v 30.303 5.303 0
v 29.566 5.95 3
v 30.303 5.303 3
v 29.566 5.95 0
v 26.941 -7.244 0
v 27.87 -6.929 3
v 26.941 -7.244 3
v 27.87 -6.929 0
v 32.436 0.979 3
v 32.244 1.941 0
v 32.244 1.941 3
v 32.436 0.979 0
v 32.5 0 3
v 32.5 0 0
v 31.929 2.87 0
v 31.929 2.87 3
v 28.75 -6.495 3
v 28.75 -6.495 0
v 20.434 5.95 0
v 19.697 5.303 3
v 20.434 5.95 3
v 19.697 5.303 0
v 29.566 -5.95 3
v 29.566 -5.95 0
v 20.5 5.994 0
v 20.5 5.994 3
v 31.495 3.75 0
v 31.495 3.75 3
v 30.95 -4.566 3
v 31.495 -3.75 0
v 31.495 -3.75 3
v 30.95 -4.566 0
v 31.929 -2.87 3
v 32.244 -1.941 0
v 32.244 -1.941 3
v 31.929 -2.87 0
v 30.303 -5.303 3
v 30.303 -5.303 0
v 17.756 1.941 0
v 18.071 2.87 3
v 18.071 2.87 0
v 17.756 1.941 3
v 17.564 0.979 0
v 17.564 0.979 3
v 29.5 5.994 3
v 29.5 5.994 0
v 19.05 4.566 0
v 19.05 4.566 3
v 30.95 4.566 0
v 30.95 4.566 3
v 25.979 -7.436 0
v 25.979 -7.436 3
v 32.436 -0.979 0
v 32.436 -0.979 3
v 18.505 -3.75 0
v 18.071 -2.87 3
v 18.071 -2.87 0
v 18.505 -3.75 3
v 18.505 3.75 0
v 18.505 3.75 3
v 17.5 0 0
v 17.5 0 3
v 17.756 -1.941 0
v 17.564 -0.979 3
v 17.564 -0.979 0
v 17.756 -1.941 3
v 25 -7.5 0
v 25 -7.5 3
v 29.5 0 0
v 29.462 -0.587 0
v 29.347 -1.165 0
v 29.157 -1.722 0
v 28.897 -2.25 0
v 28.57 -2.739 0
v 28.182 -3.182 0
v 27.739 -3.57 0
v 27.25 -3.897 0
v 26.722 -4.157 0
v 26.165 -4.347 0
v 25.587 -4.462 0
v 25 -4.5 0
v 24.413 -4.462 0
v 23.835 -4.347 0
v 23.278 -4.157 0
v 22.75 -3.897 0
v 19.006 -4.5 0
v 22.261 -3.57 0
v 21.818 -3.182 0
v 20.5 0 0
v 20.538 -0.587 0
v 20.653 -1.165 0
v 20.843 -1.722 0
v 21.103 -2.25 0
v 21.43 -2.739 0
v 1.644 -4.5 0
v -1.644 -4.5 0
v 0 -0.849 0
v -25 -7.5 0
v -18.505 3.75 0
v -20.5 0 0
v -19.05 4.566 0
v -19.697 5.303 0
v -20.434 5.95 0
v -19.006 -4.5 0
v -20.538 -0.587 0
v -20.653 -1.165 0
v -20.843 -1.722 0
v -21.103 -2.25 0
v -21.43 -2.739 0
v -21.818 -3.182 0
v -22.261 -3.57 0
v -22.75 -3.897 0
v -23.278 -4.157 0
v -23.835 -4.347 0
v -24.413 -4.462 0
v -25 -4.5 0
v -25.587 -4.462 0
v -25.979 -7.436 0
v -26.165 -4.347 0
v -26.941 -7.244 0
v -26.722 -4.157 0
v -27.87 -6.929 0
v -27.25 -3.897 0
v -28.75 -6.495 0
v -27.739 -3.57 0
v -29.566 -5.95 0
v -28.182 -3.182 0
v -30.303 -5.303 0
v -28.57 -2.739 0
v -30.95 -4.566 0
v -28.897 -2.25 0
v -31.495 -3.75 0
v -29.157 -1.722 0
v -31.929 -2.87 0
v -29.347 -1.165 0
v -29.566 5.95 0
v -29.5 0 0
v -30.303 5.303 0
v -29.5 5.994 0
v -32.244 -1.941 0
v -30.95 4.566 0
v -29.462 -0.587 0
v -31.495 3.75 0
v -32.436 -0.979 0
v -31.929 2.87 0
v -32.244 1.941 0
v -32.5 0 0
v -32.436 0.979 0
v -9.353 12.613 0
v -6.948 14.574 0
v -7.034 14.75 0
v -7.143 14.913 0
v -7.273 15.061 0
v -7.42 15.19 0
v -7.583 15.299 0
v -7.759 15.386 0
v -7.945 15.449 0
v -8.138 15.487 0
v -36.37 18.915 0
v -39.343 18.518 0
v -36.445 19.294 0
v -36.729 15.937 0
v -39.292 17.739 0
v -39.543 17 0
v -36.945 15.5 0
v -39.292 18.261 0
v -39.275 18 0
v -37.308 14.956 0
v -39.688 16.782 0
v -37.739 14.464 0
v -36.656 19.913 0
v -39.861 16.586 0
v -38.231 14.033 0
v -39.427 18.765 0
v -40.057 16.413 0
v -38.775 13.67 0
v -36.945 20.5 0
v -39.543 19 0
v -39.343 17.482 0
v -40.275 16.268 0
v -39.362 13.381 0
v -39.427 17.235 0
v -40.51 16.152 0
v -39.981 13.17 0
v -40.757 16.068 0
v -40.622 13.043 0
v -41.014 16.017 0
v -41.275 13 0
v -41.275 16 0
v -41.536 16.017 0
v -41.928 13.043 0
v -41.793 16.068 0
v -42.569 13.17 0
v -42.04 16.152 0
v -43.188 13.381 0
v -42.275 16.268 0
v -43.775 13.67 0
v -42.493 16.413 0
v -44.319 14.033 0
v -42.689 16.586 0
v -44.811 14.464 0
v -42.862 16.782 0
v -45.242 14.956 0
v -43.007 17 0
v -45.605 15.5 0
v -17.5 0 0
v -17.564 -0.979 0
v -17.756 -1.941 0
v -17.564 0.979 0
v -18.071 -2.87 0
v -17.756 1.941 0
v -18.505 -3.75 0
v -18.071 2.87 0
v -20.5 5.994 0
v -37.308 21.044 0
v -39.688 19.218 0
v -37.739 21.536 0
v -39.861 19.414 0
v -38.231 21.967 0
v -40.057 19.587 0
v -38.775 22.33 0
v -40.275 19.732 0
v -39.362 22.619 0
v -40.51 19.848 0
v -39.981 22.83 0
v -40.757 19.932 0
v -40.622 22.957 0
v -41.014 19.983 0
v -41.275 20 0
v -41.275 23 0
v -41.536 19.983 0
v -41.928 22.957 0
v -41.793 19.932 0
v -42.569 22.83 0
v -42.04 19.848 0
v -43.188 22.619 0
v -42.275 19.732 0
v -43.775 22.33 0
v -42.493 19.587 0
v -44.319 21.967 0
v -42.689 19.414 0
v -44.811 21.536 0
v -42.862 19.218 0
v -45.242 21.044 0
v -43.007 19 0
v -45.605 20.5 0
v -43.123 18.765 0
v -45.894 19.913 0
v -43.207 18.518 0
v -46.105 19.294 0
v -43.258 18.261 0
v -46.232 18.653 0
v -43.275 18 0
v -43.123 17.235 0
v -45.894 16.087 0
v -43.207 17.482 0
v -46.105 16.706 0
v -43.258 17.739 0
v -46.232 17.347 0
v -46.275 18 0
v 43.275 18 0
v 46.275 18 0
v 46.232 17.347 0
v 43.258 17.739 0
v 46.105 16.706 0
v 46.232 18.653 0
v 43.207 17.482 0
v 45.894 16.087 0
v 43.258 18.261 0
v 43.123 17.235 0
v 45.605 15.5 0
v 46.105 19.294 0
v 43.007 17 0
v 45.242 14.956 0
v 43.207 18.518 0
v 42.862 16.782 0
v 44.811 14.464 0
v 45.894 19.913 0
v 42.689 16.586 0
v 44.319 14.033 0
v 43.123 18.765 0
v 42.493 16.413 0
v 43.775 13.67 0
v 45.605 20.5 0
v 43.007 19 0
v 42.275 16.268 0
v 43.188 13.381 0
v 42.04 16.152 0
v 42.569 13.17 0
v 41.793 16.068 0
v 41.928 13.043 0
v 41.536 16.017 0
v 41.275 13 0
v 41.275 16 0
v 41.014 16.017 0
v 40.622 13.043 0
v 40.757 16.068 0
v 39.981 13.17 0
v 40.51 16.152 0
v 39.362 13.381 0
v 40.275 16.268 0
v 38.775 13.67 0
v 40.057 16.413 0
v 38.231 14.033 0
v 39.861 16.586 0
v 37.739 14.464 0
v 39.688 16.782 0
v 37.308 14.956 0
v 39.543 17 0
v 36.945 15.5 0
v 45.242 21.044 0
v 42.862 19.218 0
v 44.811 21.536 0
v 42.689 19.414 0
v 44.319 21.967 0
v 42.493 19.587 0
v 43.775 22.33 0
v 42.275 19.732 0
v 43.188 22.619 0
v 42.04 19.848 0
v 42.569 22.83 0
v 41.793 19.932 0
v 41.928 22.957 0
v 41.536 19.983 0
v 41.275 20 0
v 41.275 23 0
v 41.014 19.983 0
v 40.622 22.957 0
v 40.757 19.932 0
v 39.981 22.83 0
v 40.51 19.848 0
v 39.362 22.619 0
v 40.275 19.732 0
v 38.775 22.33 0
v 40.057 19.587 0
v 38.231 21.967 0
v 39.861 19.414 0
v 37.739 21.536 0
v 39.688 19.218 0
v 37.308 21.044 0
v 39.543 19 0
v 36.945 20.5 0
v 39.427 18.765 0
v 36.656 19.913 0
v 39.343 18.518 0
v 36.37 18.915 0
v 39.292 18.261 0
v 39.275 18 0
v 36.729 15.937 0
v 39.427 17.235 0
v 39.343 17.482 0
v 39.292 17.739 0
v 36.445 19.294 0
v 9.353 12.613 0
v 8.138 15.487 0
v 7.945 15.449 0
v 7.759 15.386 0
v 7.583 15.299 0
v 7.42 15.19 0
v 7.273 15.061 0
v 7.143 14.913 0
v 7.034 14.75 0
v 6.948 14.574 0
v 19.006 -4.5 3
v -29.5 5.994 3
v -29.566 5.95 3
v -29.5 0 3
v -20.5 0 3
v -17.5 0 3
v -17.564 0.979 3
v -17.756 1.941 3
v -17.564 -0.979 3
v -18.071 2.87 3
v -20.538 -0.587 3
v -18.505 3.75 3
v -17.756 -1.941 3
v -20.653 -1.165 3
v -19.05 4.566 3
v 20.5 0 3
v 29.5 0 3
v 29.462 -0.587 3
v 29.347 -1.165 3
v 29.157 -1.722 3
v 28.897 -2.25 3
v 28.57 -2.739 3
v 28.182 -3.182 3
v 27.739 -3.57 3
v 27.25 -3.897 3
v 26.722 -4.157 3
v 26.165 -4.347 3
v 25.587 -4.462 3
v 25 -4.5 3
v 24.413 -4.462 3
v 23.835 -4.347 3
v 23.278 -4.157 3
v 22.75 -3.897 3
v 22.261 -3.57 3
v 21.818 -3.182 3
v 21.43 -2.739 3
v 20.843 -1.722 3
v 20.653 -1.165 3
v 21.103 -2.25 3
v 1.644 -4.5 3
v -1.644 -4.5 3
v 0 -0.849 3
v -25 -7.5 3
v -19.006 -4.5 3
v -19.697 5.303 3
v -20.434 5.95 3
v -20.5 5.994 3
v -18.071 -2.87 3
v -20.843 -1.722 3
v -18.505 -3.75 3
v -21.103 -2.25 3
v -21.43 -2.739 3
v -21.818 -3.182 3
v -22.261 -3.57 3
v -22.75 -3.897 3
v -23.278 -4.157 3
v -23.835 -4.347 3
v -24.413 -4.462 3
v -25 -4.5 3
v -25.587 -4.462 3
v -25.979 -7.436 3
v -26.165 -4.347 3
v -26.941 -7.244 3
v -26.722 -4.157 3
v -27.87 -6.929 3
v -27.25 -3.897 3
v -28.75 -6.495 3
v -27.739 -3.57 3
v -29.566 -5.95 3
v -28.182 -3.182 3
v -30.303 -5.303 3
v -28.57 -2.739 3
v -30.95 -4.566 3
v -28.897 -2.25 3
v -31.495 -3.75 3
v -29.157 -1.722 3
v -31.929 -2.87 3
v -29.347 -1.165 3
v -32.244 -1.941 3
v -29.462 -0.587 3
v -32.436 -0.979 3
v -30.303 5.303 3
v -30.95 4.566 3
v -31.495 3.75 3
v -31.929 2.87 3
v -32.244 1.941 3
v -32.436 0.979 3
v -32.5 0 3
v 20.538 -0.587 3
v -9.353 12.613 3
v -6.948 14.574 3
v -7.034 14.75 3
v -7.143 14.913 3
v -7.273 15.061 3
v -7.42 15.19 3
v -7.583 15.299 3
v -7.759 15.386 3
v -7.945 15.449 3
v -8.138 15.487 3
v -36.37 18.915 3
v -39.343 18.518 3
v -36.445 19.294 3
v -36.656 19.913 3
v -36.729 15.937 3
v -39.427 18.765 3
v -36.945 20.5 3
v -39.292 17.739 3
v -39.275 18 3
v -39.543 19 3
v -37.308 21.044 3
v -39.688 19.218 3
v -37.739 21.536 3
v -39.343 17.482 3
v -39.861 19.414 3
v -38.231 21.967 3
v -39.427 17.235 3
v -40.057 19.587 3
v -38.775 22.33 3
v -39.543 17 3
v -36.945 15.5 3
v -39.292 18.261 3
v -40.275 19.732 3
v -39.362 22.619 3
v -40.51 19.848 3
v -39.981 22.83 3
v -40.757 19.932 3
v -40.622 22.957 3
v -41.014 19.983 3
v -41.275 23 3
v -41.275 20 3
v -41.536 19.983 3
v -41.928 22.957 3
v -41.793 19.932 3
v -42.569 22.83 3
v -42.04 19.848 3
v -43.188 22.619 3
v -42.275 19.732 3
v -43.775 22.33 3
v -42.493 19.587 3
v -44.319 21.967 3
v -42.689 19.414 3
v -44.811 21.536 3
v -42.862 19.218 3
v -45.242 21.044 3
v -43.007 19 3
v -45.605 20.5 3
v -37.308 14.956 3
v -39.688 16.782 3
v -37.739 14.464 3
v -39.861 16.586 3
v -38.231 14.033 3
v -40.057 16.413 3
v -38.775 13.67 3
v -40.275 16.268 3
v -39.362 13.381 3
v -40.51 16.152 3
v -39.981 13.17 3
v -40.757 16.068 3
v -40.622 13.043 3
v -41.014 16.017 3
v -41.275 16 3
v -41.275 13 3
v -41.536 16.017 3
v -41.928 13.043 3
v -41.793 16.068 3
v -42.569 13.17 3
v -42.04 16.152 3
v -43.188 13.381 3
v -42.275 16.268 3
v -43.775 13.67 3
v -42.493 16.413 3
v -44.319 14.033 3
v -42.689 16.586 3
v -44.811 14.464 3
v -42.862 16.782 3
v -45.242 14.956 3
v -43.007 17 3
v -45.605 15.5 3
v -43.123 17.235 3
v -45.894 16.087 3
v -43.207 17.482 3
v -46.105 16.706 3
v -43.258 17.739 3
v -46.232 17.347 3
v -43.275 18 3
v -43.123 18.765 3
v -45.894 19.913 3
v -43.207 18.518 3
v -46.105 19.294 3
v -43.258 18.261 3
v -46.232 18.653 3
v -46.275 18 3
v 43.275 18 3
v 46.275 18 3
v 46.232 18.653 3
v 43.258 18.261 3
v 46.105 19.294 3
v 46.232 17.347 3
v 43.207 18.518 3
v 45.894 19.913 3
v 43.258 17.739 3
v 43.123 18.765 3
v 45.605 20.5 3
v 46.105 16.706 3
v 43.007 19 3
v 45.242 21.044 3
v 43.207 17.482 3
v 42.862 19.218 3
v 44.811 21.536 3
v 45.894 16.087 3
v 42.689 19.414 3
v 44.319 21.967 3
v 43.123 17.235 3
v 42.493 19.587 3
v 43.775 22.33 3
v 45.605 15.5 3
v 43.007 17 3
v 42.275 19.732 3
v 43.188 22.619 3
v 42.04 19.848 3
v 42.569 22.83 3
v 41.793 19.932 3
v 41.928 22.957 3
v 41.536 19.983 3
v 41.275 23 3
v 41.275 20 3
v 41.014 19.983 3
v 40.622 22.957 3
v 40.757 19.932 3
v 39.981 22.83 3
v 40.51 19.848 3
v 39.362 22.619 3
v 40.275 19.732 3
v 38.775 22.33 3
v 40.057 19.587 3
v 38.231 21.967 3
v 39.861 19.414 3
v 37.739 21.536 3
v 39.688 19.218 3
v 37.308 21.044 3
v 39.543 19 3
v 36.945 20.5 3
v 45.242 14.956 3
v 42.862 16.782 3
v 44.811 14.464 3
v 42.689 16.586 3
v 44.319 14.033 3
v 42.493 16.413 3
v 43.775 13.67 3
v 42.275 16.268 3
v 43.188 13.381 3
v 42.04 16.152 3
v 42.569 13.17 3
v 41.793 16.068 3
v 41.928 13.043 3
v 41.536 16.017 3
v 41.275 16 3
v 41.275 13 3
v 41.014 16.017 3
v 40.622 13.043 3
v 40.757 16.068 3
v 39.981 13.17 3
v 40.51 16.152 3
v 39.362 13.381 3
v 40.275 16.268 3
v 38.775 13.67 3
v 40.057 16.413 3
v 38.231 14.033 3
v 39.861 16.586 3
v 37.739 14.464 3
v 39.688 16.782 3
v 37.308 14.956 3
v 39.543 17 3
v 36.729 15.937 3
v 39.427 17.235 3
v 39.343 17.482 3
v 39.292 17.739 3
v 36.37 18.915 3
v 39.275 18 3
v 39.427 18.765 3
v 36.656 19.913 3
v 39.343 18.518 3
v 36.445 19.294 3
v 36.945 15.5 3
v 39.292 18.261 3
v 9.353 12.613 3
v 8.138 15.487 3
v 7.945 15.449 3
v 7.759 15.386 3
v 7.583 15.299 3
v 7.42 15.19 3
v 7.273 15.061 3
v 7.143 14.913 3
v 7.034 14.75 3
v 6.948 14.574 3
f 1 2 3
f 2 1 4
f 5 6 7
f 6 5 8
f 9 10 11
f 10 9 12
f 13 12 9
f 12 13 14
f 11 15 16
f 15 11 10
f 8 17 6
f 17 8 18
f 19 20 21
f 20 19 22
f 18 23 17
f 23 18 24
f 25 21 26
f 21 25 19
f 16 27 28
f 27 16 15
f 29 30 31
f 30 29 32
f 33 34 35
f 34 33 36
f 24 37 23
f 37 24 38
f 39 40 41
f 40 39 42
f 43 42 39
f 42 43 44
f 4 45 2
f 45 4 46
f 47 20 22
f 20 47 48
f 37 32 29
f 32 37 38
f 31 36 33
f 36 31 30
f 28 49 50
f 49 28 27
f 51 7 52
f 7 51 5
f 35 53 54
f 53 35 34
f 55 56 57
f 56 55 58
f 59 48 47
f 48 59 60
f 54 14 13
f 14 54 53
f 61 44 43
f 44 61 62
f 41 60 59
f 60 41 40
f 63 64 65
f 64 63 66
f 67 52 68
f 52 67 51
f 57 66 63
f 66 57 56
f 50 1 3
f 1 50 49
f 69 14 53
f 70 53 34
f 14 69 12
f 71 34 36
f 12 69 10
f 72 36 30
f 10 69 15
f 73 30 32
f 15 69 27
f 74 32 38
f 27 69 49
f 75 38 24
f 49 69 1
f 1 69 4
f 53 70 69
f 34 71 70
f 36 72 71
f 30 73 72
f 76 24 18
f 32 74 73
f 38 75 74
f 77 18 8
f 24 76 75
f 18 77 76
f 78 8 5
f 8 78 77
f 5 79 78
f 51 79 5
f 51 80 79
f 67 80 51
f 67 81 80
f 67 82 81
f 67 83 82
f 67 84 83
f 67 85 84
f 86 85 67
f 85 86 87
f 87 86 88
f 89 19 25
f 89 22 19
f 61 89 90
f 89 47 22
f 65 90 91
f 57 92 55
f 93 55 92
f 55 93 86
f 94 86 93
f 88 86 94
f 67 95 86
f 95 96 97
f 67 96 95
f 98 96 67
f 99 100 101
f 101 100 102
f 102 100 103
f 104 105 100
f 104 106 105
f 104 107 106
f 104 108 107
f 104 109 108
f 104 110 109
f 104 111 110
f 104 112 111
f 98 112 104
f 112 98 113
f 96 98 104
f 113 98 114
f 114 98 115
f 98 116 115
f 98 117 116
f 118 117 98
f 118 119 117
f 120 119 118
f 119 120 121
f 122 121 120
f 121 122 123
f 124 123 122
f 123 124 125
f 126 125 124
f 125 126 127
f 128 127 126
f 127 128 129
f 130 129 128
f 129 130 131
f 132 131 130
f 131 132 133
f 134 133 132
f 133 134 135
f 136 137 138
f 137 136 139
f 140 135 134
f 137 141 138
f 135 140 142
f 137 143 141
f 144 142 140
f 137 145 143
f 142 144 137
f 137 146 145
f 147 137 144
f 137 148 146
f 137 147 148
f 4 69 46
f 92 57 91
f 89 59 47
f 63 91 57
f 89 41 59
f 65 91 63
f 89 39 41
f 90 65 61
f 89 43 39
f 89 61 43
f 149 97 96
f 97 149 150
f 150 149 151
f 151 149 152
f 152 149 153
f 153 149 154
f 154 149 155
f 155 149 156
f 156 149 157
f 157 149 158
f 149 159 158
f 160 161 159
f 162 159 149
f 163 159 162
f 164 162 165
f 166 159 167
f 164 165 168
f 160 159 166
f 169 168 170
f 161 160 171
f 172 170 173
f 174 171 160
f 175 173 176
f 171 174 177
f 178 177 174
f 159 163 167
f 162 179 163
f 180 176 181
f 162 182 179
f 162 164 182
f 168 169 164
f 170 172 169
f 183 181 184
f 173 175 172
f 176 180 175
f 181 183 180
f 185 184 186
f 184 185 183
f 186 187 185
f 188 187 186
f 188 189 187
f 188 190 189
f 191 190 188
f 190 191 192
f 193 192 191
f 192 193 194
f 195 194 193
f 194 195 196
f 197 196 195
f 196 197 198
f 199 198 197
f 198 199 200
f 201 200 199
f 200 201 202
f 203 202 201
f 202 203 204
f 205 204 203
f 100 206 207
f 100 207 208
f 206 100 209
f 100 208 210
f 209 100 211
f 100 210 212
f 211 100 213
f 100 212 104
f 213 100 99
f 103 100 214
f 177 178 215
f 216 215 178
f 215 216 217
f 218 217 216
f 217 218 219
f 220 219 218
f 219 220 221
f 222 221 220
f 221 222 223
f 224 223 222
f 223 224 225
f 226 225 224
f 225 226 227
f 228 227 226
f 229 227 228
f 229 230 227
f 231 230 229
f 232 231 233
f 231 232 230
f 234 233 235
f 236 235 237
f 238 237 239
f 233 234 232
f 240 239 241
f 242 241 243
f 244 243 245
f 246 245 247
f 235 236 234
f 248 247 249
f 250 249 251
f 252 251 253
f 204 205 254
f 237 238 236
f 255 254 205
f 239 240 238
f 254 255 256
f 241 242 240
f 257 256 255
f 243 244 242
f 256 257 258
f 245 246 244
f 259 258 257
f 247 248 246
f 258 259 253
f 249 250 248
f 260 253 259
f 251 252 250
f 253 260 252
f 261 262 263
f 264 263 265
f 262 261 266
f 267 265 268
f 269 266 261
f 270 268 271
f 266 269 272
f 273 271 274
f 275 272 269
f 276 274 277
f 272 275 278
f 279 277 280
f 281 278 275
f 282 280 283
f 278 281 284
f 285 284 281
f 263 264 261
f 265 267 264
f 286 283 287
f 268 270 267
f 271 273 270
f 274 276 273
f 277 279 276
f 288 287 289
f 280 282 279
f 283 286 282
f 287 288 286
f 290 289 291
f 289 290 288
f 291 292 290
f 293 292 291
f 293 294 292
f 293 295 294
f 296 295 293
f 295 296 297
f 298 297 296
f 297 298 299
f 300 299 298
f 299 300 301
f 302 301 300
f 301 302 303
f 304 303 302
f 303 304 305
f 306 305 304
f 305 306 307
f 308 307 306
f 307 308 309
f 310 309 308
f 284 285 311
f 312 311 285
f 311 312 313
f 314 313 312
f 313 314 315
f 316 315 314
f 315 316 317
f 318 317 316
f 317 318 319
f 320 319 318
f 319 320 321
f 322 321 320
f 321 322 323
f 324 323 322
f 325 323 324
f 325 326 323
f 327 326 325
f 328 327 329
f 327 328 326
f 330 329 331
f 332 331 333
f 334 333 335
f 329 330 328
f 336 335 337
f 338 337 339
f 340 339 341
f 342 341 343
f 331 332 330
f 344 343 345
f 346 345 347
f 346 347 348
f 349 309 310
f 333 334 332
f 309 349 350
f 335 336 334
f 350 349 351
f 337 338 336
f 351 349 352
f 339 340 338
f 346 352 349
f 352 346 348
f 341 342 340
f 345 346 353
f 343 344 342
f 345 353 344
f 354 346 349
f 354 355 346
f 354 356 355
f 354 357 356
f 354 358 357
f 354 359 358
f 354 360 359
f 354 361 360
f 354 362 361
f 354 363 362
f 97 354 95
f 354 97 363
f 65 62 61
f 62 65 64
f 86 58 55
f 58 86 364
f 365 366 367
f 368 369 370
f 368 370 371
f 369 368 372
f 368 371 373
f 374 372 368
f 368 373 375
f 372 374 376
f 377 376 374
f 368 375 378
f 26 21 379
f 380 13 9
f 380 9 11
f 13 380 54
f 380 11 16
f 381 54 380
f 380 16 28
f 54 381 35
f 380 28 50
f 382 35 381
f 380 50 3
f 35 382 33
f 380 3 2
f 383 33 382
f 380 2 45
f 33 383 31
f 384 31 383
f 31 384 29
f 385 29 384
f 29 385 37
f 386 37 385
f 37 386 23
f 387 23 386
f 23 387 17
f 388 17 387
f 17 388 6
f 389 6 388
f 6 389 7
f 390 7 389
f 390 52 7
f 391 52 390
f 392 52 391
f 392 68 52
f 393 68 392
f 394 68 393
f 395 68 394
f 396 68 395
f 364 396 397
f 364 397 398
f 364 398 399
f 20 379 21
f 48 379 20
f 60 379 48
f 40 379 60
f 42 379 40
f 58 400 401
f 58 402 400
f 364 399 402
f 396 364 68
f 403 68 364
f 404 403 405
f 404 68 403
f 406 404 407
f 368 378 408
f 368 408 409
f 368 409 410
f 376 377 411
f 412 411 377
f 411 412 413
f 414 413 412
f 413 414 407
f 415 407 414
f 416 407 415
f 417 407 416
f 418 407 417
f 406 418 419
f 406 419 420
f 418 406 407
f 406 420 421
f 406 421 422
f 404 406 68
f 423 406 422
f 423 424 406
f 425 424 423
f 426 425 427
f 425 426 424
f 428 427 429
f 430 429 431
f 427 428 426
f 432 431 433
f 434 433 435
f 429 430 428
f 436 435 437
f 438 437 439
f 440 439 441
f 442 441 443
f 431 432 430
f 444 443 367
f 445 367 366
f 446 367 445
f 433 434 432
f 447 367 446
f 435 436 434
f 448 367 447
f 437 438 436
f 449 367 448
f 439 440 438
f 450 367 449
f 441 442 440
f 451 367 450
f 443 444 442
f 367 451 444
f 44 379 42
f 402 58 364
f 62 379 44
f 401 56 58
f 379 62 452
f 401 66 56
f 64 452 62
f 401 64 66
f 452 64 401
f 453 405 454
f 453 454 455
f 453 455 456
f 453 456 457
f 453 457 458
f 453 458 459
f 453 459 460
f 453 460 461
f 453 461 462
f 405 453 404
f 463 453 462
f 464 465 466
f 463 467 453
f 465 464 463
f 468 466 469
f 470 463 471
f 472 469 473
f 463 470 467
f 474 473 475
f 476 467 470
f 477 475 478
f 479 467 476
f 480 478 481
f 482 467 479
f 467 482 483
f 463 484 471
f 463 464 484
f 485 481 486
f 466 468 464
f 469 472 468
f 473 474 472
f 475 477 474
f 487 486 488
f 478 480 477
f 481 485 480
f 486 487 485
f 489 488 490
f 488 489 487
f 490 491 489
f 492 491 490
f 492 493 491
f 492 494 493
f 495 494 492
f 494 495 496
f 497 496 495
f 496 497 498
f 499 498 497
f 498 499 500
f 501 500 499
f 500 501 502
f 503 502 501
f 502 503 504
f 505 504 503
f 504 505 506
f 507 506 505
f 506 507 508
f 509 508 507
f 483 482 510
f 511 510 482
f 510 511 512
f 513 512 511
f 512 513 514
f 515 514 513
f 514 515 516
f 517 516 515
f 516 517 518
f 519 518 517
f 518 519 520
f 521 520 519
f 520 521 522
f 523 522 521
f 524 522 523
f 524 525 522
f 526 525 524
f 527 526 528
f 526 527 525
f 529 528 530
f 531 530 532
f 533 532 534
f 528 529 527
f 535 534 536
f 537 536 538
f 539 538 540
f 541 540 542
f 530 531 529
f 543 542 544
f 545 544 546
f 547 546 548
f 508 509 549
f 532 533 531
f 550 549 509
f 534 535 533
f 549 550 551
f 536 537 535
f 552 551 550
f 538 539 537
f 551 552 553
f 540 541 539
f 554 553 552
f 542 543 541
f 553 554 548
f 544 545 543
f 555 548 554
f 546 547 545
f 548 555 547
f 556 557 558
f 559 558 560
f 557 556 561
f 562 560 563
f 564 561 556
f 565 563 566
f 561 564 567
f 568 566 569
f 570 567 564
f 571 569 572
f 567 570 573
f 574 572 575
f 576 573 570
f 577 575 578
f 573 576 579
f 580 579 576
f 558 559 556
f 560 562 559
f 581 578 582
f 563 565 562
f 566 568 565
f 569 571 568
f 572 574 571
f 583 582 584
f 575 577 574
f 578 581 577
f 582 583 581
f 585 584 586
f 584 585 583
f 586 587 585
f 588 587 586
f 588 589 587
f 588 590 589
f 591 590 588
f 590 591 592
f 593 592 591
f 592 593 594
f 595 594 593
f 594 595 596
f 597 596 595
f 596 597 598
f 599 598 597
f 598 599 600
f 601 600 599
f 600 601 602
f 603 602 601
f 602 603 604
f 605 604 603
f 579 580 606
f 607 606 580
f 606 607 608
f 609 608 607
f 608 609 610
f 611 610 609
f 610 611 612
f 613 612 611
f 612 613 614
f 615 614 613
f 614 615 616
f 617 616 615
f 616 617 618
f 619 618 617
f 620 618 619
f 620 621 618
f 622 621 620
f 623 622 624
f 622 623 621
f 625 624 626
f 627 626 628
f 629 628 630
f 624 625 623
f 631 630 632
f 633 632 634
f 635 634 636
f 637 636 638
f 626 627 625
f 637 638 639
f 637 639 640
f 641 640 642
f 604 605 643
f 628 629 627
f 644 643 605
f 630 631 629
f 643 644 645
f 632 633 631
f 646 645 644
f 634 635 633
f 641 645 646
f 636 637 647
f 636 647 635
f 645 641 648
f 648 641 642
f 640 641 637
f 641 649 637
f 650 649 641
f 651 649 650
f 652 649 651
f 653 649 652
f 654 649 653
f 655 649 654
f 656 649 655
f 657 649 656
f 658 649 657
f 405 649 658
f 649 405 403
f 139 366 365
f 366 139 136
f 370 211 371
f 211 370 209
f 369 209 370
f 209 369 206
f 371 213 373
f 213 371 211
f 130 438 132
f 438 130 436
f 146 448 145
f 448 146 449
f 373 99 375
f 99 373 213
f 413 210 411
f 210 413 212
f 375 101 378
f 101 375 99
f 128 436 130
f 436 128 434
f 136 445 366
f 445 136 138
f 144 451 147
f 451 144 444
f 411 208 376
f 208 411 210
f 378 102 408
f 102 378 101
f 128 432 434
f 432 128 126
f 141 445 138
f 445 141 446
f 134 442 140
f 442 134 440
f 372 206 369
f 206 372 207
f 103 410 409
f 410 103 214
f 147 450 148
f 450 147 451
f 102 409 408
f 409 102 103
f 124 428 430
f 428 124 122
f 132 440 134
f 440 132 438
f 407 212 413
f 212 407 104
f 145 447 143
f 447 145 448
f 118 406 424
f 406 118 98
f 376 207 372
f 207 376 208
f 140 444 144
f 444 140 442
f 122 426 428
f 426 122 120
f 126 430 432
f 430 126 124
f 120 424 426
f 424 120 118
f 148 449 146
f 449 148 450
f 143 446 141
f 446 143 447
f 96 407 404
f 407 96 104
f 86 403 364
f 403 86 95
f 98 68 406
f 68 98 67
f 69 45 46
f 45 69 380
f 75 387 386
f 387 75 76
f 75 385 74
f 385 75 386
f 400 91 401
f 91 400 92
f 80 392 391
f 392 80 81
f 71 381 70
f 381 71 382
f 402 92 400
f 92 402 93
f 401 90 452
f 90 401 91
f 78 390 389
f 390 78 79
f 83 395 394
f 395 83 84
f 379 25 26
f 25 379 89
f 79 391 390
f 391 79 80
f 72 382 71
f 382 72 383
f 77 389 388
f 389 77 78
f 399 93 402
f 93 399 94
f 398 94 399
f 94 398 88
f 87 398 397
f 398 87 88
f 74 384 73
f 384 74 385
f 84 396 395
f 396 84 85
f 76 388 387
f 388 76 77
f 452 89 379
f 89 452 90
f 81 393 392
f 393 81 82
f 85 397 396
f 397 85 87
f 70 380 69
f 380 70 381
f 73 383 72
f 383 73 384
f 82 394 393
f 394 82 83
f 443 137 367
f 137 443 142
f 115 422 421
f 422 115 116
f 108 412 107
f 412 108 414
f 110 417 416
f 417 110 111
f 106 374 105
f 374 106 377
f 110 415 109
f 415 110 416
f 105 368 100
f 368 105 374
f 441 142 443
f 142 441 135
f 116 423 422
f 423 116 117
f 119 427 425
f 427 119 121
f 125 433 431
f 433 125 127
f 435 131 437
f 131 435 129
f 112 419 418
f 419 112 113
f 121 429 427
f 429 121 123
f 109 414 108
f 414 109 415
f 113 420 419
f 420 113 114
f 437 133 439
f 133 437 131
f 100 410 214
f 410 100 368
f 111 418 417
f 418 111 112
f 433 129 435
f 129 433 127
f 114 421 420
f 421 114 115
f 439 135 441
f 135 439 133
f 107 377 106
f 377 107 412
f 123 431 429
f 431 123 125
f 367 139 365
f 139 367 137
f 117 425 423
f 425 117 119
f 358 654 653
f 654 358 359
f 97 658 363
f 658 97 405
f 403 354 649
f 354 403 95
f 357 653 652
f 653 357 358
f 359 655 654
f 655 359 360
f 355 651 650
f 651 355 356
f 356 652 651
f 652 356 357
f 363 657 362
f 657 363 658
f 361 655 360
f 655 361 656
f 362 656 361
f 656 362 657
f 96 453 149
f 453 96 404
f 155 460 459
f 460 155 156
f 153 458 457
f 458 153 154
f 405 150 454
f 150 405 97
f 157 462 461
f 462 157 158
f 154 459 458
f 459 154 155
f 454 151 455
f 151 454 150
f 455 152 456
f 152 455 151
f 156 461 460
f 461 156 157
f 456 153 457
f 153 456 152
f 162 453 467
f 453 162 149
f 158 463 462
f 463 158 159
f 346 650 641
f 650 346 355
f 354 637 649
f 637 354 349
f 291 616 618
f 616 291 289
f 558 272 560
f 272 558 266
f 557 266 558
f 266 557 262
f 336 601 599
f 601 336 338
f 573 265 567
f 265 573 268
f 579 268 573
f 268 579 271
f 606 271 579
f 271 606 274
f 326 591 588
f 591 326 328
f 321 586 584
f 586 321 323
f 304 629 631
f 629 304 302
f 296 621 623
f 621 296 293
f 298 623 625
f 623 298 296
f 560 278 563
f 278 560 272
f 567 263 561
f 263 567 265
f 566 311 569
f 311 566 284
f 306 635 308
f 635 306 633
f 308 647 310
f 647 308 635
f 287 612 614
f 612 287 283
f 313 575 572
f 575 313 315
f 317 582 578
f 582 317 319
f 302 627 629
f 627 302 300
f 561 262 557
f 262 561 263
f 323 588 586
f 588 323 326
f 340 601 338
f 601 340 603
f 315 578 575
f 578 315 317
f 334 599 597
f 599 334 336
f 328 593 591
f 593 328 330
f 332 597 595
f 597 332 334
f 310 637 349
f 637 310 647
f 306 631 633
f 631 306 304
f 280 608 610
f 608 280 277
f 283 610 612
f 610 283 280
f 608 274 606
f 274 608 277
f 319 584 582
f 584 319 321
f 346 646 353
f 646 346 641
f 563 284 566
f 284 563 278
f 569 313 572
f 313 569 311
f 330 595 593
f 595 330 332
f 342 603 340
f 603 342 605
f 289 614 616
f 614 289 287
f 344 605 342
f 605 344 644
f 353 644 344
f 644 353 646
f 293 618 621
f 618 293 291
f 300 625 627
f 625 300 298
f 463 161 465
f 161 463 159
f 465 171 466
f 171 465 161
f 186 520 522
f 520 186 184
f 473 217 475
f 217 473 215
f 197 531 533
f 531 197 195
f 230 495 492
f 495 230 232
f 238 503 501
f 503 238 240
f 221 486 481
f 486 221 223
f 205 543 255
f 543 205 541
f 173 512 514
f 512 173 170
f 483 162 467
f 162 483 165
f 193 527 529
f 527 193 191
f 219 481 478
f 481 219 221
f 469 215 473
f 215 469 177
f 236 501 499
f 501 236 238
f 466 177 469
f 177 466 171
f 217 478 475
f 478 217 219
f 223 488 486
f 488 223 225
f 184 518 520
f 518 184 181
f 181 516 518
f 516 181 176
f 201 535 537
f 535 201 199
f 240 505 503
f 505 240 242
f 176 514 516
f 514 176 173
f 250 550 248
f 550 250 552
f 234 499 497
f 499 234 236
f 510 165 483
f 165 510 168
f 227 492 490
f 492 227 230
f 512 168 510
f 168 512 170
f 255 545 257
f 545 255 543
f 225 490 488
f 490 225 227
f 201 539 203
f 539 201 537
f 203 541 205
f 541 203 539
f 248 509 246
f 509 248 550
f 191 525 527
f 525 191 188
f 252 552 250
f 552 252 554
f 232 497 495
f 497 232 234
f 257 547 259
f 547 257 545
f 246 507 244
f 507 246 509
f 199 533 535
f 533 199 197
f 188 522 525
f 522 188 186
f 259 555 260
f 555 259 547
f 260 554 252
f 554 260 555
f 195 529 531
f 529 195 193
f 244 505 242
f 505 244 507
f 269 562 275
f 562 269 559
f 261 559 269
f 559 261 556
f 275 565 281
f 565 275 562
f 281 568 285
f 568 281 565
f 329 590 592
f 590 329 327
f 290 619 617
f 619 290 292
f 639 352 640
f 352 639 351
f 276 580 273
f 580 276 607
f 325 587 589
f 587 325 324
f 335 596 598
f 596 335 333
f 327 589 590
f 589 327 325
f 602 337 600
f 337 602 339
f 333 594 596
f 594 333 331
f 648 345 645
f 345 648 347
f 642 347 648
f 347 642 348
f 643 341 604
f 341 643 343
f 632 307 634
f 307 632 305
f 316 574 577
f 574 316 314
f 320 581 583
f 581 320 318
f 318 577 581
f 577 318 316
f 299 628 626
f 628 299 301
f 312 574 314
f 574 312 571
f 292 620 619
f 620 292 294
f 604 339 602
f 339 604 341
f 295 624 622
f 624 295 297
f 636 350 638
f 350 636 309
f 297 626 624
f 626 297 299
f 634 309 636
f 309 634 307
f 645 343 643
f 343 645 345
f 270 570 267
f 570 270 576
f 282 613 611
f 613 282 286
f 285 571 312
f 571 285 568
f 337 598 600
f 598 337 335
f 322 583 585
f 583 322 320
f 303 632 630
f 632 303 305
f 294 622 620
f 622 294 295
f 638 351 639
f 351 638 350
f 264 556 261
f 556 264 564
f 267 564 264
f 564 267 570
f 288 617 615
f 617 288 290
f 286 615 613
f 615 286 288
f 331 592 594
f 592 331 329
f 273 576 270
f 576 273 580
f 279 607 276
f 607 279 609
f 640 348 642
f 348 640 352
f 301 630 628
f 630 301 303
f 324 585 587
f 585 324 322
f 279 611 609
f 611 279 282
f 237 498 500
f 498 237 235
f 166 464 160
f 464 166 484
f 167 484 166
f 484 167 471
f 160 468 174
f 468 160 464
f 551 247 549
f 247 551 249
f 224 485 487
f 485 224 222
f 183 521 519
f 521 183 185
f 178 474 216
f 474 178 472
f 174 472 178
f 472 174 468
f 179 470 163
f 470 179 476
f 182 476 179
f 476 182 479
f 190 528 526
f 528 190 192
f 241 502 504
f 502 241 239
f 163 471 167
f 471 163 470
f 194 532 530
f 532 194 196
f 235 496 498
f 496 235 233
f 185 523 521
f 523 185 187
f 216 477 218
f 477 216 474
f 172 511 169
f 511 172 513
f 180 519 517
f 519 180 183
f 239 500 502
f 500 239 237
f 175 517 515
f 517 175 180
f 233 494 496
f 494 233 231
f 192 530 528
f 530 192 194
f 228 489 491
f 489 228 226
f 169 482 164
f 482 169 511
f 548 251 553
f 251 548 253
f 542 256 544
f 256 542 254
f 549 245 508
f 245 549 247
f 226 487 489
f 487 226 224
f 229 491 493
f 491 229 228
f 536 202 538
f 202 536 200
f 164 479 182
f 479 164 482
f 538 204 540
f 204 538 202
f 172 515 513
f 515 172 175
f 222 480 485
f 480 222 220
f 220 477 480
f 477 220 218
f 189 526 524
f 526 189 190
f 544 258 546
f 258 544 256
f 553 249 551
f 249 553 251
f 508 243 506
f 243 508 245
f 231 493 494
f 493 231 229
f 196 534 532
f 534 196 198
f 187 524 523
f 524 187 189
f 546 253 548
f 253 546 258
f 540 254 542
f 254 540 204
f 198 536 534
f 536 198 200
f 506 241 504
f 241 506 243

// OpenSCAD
// [FL_INDEX: keywords="openscad, 3d_parametric, Prusa_X-Axis_Fan_Holder, csg_solid" | COT="Parametric OpenSCAD design from 3DCodeverse"]
// Title: Prusa X-Axis Fan Holder

//Distance Between the X Axis Bars
X_Bar_Distance=50;

//The Diameter of the X Axis Bars
X_Bar_Diameter=9; 

//The Distance Between the Screw Holes on the Fan
Fan_Screw_Distance=82.55; 

//The Diameter of the Screw to Hold the Fan in Place
Fan_Screw_Diameter=4;

//The Thickness of the Holder. This affects the thickness on the Z axis as well as on the X/Y Axis
Overall_Thickness=3;

//The Resolution of the Holder
Resolution=48; 

//Ignore this variable
$fn=Resolution;

fan_holder();

module fan_holder(){
difference(){
	union(){
	
	
		translate([X_Bar_Distance/2,0,0])
			cylinder(Overall_Thickness, (X_Bar_Diameter)/2+Overall_Thickness,(X_Bar_Diameter)/2+Overall_Thickness);
		
		translate([X_Bar_Distance/-2,0,0])
			cylinder(Overall_Thickness, (X_Bar_Diameter)/2+Overall_Thickness,(X_Bar_Diameter)/2+Overall_Thickness);
		
		translate([0,(X_Bar_Diameter+Overall_Thickness)/-2,Overall_Thickness/2])
		cube([X_Bar_Distance,Overall_Thickness, Overall_Thickness],center = true);
	
	}
		hull(){
		
		translate([X_Bar_Distance/2,0,-1])
			cylinder(Overall_Thickness+2, (X_Bar_Diameter)/2,(X_Bar_Diameter)/2);
		
		translate([X_Bar_Distance/2,X_Bar_Diameter*3,-1])
			cylinder(Overall_Thickness+2, (X_Bar_Diameter)/2,(X_Bar_Diameter)/2);
	
	}

	hull(){
		translate([X_Bar_Distance/-2,0,-1])
			cylinder(Overall_Thickness+2, (X_Bar_Diameter)/2,(X_Bar_Diameter)/2);
		
		translate([X_Bar_Distance/-2,X_Bar_Diameter*3,-1])
			cylinder(Overall_Thickness+2, (X_Bar_Diameter)/2,(X_Bar_Diameter)/2);
	
	}

}
difference(){
union(){

hull(){
translate([0,(X_Bar_Diameter)/-2,0])
cylinder(Overall_Thickness,(Overall_Thickness)/2,(Overall_Thickness)/2);

translate([X_Bar_Distance/6,(X_Bar_Diameter+Overall_Thickness+2),0])
cylinder(Overall_Thickness,(Overall_Thickness)/2,(Overall_Thickness)/2);
}

hull(){
translate([0,(X_Bar_Diameter)/-2,0])
cylinder(Overall_Thickness,(Overall_Thickness)/2,(Overall_Thickness)/2);

translate([X_Bar_Distance/-6,(X_Bar_Diameter+Overall_Thickness+2),0])
cylinder(Overall_Thickness,(Overall_Thickness)/2,(Overall_Thickness)/2);
}

hull(){
translate([X_Bar_Distance/-6,(X_Bar_Diameter+Overall_Thickness+2),0])
cylinder(Overall_Thickness,(Overall_Thickness)/2,(Overall_Thickness)/2);

translate([Fan_Screw_Distance/-2,(X_Bar_Diameter+Overall_Thickness)*1.5,0])
cylinder(Overall_Thickness,(Overall_Thickness)/2,(Overall_Thickness)/2);
}

hull(){
translate([X_Bar_Distance/6,(X_Bar_Diameter+Overall_Thickness+2),0])
cylinder(Overall_Thickness,(Overall_Thickness)/2,(Overall_Thickness)/2);

translate([Fan_Screw_Distance/2,(X_Bar_Diameter+Overall_Thickness)*1.5,0])
cylinder(Overall_Thickness,(Overall_Thickness)/2,(Overall_Thickness)/2);
}

translate([Fan_Screw_Distance/2,(X_Bar_Diameter+Overall_Thickness)*1.5,0])
cylinder(Overall_Thickness,(Fan_Screw_Diameter)/2+Overall_Thickness,(Fan_Screw_Diameter)/2+Overall_Thickness);

translate([Fan_Screw_Distance/-2,(X_Bar_Diameter+Overall_Thickness)*1.5,0])
cylinder(Overall_Thickness,(Fan_Screw_Diameter)/2+Overall_Thickness,(Fan_Screw_Diameter)/2+Overall_Thickness);

}

translate([Fan_Screw_Distance/2,(X_Bar_Diameter+Overall_Thickness)*1.5,-1])
cylinder(Overall_Thickness+2,(Fan_Screw_Diameter)/2,(Fan_Screw_Diameter)/2);

translate([Fan_Screw_Distance/-2,(X_Bar_Diameter+Overall_Thickness)*1.5,-1])
cylinder(Overall_Thickness+2,(Fan_Screw_Diameter)/2,(Fan_Screw_Diameter)/2);

}
}
